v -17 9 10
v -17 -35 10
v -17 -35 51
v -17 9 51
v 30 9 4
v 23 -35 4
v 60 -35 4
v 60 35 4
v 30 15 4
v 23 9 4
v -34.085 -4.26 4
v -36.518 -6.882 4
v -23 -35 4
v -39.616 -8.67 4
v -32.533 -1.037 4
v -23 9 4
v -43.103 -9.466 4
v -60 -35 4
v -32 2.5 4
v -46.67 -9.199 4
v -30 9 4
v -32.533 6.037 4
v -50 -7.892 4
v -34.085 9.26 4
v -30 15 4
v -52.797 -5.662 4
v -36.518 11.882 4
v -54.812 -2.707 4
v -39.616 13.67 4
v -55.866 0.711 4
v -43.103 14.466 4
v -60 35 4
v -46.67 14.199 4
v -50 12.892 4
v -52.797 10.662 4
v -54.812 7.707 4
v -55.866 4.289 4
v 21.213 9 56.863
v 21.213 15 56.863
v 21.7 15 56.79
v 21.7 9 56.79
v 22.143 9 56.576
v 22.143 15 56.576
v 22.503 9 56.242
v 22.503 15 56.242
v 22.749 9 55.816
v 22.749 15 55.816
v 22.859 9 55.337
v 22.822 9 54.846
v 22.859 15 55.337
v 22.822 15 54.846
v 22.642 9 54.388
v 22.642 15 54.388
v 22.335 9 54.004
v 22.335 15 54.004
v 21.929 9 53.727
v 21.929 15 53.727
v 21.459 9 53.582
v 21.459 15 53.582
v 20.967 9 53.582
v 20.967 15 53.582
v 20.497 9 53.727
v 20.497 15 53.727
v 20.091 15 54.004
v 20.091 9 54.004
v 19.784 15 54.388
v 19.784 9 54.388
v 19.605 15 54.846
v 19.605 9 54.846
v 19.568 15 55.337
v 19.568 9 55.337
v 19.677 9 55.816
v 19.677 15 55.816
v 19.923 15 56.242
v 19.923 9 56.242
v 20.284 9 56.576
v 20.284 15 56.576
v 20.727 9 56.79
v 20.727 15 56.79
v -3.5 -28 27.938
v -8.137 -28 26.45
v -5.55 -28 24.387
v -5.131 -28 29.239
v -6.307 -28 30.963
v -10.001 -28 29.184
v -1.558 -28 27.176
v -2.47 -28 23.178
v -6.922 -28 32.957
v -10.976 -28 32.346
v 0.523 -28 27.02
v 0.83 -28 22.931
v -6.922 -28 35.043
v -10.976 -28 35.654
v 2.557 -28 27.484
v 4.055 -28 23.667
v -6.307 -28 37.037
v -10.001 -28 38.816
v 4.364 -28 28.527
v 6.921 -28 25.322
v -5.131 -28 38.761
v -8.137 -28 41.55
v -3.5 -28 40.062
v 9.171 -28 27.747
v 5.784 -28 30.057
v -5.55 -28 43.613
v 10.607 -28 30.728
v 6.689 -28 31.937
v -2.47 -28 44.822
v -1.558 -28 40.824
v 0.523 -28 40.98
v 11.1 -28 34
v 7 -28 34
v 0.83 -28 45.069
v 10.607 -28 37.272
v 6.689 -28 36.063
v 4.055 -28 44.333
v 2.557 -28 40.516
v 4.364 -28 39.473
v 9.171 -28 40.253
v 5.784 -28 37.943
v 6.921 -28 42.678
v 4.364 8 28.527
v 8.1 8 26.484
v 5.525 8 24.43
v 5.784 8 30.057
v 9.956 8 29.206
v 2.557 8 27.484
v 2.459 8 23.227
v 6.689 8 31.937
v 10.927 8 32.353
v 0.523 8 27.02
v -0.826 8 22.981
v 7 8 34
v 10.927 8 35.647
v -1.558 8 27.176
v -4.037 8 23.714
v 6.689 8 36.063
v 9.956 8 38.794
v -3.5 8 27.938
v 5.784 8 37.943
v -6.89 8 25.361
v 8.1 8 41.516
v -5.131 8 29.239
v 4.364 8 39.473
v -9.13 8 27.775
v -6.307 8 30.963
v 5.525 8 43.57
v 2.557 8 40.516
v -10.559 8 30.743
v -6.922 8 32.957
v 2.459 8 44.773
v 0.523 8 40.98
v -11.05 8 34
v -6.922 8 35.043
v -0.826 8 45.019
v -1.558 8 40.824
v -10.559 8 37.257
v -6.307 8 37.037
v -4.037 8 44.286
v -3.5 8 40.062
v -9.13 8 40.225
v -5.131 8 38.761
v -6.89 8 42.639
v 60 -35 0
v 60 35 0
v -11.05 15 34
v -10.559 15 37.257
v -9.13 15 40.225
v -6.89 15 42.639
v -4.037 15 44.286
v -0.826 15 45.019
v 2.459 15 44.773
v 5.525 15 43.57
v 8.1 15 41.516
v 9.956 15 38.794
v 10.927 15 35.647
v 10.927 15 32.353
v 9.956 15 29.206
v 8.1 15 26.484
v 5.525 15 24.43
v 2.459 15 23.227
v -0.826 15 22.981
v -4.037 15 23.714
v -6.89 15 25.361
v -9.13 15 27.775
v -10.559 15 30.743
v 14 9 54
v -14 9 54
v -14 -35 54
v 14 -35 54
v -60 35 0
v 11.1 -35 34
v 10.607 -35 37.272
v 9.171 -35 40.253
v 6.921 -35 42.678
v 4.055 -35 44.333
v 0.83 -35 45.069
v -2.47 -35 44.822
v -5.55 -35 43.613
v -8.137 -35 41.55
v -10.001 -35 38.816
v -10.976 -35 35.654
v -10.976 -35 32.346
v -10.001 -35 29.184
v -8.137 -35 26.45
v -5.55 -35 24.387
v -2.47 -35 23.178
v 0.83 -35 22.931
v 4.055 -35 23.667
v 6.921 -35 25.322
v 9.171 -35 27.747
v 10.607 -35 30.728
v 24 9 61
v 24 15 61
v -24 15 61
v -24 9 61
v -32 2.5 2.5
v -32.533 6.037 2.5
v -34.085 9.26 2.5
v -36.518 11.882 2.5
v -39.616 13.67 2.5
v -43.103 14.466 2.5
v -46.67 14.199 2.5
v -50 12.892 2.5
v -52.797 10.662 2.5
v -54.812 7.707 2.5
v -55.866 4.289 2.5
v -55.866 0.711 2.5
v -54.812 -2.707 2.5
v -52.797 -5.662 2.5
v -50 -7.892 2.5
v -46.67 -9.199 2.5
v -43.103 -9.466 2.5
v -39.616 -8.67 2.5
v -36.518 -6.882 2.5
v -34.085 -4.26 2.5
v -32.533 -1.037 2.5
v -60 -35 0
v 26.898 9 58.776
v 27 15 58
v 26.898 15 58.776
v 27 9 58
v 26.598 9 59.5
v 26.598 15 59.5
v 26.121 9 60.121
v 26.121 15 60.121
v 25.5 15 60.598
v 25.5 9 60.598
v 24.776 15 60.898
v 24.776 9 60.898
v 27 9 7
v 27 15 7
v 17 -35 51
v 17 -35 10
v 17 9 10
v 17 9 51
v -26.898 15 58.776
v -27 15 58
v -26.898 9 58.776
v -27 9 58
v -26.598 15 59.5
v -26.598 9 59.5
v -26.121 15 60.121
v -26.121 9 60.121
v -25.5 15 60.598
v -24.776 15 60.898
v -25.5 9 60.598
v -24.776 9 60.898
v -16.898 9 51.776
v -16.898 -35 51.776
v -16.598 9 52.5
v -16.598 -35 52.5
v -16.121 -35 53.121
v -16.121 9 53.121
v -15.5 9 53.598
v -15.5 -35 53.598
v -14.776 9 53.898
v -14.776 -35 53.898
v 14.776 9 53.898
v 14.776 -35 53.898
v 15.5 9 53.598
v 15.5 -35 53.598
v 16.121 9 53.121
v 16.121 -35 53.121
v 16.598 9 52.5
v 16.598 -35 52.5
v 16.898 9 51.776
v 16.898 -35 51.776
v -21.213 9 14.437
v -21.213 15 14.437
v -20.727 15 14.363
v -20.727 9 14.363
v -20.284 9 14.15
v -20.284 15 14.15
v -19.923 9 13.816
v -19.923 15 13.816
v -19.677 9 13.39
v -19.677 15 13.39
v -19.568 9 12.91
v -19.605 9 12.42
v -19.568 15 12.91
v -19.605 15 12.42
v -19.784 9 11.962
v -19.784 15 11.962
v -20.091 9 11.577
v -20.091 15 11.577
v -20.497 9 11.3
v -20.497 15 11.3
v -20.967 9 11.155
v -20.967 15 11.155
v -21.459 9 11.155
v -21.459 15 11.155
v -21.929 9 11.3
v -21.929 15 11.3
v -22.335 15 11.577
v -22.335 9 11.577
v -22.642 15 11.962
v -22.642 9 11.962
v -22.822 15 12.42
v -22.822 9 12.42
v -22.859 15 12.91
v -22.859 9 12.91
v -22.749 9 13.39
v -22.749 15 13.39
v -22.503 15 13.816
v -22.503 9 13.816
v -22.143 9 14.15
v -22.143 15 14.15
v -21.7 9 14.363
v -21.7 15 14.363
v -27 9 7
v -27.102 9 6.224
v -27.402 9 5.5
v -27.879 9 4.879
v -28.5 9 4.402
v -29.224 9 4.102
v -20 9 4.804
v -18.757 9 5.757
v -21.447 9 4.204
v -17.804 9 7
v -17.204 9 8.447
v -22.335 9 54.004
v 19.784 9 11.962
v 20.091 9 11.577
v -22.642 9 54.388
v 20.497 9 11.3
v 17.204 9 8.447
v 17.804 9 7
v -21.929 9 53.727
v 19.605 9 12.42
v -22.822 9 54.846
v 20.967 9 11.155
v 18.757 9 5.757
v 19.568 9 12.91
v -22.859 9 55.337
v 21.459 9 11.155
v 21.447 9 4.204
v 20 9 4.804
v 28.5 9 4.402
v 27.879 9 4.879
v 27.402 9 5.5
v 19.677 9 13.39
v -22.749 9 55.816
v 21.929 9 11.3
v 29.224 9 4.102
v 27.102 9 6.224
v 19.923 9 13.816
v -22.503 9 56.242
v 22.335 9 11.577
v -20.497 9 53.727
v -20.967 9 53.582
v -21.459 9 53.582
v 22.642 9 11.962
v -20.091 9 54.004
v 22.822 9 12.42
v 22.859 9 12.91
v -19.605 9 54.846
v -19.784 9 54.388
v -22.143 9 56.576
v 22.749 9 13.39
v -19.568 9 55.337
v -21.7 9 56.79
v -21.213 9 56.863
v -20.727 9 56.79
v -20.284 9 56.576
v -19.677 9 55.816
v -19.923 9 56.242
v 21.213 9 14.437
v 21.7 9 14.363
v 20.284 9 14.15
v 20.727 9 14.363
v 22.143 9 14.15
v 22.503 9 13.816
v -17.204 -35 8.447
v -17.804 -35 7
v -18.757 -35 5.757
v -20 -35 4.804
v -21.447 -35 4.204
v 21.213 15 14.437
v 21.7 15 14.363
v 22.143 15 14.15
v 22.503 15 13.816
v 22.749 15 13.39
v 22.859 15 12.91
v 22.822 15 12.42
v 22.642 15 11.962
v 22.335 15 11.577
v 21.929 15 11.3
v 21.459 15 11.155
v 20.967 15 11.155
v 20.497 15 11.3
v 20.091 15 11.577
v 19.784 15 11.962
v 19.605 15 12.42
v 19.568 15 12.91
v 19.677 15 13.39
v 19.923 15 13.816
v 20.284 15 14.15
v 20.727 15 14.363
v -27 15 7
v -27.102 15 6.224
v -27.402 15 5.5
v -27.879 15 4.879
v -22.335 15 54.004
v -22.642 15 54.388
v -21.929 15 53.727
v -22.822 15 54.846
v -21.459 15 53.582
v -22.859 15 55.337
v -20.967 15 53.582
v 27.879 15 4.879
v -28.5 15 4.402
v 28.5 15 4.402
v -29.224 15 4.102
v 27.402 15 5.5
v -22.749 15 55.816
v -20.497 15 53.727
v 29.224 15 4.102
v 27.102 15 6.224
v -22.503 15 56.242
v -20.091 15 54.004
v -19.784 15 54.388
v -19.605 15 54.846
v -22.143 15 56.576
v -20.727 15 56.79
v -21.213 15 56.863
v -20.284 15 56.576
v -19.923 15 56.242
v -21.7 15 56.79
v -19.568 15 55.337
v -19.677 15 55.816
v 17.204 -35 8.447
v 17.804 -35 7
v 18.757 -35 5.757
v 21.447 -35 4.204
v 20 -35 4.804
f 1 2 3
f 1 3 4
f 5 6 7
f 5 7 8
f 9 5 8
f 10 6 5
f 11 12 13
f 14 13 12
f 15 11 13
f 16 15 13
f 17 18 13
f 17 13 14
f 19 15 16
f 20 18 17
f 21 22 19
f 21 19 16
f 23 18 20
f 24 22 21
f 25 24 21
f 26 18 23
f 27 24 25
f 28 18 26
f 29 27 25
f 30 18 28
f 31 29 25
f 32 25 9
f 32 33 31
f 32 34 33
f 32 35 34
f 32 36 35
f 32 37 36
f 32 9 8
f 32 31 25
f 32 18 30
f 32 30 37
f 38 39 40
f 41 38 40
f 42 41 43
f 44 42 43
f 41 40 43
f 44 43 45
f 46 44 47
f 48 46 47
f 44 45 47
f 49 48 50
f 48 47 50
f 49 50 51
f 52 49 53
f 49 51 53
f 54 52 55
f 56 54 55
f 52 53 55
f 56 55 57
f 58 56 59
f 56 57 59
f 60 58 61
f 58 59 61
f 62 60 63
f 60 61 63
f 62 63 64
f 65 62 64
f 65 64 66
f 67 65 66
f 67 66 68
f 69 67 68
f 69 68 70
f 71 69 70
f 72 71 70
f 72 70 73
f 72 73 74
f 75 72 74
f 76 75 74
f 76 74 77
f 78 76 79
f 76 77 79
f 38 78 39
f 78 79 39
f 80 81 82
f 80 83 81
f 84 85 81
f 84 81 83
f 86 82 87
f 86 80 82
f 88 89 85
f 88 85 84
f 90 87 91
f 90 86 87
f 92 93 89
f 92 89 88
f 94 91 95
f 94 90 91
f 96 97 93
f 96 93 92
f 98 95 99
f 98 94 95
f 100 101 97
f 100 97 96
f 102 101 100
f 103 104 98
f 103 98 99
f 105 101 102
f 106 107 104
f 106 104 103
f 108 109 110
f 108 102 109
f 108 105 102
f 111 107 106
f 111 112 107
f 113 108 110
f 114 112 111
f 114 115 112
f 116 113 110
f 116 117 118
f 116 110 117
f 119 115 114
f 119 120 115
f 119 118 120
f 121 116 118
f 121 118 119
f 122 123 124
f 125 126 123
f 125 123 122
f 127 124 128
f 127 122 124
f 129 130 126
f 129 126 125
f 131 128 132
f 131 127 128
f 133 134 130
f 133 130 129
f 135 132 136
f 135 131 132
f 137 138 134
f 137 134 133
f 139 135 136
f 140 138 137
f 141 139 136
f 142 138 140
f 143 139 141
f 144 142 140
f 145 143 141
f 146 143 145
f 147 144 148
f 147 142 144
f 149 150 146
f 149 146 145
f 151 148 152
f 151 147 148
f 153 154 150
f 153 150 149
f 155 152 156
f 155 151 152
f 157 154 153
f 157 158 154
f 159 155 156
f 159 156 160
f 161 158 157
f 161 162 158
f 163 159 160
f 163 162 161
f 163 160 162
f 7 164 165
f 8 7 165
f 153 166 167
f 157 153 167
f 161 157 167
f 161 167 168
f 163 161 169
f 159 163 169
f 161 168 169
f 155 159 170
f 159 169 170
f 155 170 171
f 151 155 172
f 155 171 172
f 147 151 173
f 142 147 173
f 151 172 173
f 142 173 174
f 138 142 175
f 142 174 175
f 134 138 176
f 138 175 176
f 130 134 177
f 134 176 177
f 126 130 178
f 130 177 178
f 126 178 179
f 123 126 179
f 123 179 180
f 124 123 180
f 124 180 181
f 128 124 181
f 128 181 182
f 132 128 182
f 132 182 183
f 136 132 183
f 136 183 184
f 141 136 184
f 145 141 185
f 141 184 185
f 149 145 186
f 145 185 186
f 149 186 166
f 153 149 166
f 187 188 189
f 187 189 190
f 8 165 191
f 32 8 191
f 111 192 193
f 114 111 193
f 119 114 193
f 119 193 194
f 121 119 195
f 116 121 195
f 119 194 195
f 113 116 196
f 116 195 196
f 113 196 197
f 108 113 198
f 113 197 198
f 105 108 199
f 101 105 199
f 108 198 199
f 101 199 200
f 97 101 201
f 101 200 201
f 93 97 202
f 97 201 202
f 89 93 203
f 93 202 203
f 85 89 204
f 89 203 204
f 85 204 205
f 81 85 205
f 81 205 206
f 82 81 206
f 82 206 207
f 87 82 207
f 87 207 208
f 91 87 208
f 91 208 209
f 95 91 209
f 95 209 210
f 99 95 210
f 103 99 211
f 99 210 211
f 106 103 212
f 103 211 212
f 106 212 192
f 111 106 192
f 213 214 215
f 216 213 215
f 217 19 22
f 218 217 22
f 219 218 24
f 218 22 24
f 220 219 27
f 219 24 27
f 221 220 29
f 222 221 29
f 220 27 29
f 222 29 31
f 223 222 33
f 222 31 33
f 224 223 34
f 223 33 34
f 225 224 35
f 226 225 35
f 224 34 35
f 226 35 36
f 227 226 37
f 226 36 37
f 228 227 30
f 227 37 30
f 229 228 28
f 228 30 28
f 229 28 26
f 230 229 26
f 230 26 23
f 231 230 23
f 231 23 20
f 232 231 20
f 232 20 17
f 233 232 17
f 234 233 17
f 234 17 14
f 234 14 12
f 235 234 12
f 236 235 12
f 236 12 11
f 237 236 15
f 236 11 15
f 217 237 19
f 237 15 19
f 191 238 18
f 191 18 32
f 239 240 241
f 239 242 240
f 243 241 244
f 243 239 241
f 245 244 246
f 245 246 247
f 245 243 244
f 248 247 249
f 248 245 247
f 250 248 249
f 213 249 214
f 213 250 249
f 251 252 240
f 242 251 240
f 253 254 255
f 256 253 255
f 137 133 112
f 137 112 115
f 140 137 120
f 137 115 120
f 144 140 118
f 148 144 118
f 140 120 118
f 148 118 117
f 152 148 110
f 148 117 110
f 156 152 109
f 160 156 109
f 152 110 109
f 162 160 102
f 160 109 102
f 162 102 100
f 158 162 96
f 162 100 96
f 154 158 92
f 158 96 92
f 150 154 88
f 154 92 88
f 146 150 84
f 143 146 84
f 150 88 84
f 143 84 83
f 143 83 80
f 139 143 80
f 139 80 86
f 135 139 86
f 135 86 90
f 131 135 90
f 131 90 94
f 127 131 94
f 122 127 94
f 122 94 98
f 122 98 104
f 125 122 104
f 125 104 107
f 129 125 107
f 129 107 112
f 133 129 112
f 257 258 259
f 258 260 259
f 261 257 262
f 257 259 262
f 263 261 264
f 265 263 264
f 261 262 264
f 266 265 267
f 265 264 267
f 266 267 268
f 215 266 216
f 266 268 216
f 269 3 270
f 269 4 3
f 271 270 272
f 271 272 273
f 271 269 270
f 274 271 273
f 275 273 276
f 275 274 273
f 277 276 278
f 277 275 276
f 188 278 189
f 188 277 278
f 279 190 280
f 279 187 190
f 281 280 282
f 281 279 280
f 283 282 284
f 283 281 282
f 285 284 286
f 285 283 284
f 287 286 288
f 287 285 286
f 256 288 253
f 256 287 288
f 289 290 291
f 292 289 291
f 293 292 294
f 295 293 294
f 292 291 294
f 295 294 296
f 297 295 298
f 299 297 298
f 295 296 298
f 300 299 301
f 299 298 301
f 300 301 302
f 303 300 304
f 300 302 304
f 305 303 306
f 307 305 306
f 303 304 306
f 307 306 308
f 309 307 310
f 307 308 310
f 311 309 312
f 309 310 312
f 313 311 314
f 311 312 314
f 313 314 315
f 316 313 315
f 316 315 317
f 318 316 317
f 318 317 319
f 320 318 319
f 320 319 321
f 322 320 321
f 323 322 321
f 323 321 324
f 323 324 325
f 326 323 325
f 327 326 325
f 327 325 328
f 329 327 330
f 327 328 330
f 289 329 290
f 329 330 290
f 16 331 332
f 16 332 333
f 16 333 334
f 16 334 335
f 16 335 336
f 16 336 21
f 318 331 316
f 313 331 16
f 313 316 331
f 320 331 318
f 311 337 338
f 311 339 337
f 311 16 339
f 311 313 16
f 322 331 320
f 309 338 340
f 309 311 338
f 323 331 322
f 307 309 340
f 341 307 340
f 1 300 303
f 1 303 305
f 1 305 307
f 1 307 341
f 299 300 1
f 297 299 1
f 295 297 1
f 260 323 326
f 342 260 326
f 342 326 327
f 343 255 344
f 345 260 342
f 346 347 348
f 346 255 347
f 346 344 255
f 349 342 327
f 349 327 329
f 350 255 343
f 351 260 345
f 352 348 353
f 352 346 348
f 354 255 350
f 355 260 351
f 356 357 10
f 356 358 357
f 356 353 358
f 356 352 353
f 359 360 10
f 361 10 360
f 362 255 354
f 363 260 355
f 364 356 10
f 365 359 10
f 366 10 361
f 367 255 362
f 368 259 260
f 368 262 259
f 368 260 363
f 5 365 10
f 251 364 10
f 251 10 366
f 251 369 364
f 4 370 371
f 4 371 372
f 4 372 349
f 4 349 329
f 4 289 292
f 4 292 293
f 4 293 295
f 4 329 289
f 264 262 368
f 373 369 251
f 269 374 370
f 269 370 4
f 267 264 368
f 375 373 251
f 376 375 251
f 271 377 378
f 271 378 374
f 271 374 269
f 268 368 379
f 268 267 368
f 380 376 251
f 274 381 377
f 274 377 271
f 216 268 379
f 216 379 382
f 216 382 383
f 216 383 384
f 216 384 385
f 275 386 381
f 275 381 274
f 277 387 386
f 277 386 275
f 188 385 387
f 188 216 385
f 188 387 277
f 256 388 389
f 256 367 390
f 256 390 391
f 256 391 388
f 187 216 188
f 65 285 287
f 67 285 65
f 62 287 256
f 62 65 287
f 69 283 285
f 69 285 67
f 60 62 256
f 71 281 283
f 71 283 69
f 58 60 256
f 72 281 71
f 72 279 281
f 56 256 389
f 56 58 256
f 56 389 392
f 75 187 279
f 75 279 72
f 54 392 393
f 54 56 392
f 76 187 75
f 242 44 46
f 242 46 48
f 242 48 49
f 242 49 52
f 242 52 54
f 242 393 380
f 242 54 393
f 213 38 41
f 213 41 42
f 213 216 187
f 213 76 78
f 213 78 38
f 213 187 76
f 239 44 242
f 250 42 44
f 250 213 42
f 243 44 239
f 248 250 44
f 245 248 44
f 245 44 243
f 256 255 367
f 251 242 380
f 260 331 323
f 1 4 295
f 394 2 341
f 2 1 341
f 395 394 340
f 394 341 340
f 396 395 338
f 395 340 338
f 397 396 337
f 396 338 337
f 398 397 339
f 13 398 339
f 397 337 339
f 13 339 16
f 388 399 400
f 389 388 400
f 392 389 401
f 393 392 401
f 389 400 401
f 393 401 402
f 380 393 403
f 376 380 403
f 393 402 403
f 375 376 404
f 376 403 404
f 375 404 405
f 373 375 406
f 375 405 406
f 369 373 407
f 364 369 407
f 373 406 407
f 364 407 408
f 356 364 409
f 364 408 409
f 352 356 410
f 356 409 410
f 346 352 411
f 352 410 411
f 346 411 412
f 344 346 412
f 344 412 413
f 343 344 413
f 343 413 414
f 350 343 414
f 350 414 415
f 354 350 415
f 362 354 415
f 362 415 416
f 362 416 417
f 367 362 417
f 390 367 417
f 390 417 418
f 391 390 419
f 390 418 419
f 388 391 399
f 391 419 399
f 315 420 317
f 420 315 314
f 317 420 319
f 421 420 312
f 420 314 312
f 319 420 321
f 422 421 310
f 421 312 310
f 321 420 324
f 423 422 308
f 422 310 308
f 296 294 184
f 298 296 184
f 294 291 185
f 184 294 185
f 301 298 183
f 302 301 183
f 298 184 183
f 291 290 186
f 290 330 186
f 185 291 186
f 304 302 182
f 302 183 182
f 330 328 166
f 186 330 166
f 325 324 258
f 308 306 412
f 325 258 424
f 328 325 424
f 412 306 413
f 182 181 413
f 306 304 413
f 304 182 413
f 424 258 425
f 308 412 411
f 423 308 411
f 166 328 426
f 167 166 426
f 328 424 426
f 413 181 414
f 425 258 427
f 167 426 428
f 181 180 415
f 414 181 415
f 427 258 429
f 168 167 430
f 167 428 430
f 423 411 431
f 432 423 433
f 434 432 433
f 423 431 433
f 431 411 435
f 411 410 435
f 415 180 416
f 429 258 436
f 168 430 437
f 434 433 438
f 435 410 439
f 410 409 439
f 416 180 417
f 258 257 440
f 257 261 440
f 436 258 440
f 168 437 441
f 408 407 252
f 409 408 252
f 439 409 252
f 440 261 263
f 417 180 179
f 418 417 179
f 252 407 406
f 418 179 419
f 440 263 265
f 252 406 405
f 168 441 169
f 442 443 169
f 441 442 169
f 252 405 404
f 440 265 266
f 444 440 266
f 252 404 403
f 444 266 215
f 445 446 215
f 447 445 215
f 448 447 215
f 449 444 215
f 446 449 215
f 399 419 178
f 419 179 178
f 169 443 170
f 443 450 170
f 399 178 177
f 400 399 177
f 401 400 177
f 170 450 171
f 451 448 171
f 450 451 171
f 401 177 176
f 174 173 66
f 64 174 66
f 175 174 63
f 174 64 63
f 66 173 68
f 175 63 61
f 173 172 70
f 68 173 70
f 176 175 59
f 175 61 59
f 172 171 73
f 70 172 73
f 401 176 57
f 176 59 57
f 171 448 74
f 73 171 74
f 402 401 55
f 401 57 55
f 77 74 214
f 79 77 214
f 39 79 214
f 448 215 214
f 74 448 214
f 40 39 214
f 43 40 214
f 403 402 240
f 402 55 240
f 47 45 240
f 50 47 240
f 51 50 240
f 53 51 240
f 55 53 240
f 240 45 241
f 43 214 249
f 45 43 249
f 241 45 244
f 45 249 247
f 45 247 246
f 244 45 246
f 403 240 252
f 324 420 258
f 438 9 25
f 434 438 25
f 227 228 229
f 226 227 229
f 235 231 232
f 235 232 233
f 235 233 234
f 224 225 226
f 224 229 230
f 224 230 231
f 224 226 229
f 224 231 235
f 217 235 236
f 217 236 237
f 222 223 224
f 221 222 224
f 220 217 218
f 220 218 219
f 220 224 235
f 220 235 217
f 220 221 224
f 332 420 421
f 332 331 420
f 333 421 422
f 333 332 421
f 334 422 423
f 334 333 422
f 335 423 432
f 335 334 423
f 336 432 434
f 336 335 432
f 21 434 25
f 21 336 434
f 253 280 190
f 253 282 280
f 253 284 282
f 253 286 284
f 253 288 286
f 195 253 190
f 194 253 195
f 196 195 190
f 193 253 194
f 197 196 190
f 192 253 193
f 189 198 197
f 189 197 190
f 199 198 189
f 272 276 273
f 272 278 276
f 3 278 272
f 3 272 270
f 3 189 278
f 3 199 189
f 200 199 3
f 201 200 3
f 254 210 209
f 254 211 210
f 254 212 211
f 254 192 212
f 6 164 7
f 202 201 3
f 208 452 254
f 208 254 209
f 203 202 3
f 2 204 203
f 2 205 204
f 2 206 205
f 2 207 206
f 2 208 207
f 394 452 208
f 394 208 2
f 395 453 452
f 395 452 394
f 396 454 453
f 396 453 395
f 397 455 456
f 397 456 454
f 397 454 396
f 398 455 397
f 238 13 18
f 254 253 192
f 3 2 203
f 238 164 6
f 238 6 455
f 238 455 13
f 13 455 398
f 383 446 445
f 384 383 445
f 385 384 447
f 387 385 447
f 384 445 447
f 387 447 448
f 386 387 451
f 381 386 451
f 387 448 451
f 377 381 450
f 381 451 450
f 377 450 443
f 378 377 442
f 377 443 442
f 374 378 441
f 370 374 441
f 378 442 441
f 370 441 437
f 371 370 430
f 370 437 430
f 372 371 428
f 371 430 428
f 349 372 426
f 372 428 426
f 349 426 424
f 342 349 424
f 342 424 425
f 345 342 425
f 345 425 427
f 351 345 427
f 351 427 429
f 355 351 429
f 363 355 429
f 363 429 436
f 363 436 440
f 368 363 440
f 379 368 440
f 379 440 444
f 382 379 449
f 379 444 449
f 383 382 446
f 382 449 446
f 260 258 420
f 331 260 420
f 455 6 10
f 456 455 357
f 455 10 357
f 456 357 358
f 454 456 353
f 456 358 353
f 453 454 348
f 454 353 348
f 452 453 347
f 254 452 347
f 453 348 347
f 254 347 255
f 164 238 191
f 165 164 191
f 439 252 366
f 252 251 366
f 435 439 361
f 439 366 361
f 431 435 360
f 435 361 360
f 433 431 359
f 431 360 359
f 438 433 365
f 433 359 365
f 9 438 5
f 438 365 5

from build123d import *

# Parameters (mm, degrees)
SKETCH1_W           = 70
SKETCH1_H           = 120
BOSS_EXTRUDE1_DEPTH = 4
SKETCH2_W           = 34
SKETCH2_H           = 50
BOSS_EXTRUDE2_DEPTH = 50
SKETCH3_R           = 11.1
CUT_EXTRUDE1_DEPTH  = 7
SKETCH5_R           = 7
CUT_EXTRUDE3_DEPTH  = 103.396288995
SKETCH6_R           = 11.05
CUT_EXTRUDE4_DEPTH  = 7
SKETCH7_R           = 12
CUT_EXTRUDE5_DEPTH  = 1.5
SKETCH8_R           = 1.65
BOSS_EXTRUDE3_DEPTH = 6
FILLET1_R           = 3
FILLET2_R           = 6


with BuildPart() as part:
    # Sketch1 → Boss-Extrude1 (new body)
    with BuildSketch(Plane(origin=(0, 0, 0), x_dir=(0, 1, 0), z_dir=(0, 0, 1))):
        Rectangle(SKETCH1_W, SKETCH1_H)
    extrude(amount=BOSS_EXTRUDE1_DEPTH)

    # Sketch2 → Boss-Extrude2 (add)
    with BuildSketch(Plane.XY.offset(4)):
        with Locations((0, -10)):
            Rectangle(SKETCH2_W, SKETCH2_H)
    extrude(amount=BOSS_EXTRUDE2_DEPTH)

    # Sketch3 → Cut-Extrude1 (cut)
    with BuildSketch(Plane.XZ.offset(35)):
        with Locations((0, 34)):
            Circle(SKETCH3_R)
    extrude(amount=-CUT_EXTRUDE1_DEPTH, mode=Mode.SUBTRACT)

    # Sketch5 → Cut-Extrude3 (cut, through all)
    with BuildSketch(Plane.XZ.offset(28)):
        with Locations((0, 34)):
            Circle(SKETCH5_R)
    extrude(amount=-CUT_EXTRUDE3_DEPTH, mode=Mode.SUBTRACT)

    # Sketch6 → Cut-Extrude4 (cut)
    with BuildSketch(Plane(origin=(0, 15, 0), x_dir=(-1, 0, 0), z_dir=(0, 1, 0))):
        with Locations((0, 34)):
            Circle(SKETCH6_R)
    extrude(amount=-CUT_EXTRUDE4_DEPTH, mode=Mode.SUBTRACT)

    # Sketch7 → Cut-Extrude5 (cut)
    with BuildSketch(Plane.XY.offset(4)):
        with Locations((-44, 2.5)):
            Circle(SKETCH7_R)
    extrude(amount=-CUT_EXTRUDE5_DEPTH, mode=Mode.SUBTRACT)

    # Sketch8 → Boss-Extrude3 (add)
    with BuildSketch(Plane(origin=(0, 15, 0), x_dir=(-1, 0, 0), z_dir=(0, 1, 0))):
        Polygon((-17, 4), (-27, 4), (-27, 61), (27, 61), (27, 4), (17, 4), (17, 54), (-17, 54), align=None)
        with Locations(Location((-21.213203436, 55.213203436, 0), (0, 0, 90))):
            Circle(SKETCH8_R, mode=Mode.SUBTRACT)
        with Locations(Location((21.213203436, 55.213203436, 0), (0, 0, 90))):
            Circle(SKETCH8_R, mode=Mode.SUBTRACT)
        with Locations(Location((-21.213203436, 12.786796564, 0), (0, 0, 90))):
            Circle(SKETCH8_R, mode=Mode.SUBTRACT)
        with Locations(Location((21.213203436, 12.786796564, 0), (0, 0, 90))):
            Circle(SKETCH8_R, mode=Mode.SUBTRACT)
    extrude(amount=-BOSS_EXTRUDE3_DEPTH)

    # Fillet1
    fillet1_edges = [part.edges().sort_by_distance(p)[0] for p in [
        (17, -13, 54),
        (-17, -13, 54),
        (27, 12, 4),
        (27, 12, 61),
        (-27, 12, 61),
        (-27, 12, 4),
    ]]
    fillet(fillet1_edges, radius=FILLET1_R)

    # Fillet2
    fillet2_edges = [part.edges().sort_by_distance(p)[0] for p in [
        (17, -13, 4),
        (-17, -13, 4),
    ]]
    fillet(fillet2_edges, radius=FILLET2_R)


solid = part.part
